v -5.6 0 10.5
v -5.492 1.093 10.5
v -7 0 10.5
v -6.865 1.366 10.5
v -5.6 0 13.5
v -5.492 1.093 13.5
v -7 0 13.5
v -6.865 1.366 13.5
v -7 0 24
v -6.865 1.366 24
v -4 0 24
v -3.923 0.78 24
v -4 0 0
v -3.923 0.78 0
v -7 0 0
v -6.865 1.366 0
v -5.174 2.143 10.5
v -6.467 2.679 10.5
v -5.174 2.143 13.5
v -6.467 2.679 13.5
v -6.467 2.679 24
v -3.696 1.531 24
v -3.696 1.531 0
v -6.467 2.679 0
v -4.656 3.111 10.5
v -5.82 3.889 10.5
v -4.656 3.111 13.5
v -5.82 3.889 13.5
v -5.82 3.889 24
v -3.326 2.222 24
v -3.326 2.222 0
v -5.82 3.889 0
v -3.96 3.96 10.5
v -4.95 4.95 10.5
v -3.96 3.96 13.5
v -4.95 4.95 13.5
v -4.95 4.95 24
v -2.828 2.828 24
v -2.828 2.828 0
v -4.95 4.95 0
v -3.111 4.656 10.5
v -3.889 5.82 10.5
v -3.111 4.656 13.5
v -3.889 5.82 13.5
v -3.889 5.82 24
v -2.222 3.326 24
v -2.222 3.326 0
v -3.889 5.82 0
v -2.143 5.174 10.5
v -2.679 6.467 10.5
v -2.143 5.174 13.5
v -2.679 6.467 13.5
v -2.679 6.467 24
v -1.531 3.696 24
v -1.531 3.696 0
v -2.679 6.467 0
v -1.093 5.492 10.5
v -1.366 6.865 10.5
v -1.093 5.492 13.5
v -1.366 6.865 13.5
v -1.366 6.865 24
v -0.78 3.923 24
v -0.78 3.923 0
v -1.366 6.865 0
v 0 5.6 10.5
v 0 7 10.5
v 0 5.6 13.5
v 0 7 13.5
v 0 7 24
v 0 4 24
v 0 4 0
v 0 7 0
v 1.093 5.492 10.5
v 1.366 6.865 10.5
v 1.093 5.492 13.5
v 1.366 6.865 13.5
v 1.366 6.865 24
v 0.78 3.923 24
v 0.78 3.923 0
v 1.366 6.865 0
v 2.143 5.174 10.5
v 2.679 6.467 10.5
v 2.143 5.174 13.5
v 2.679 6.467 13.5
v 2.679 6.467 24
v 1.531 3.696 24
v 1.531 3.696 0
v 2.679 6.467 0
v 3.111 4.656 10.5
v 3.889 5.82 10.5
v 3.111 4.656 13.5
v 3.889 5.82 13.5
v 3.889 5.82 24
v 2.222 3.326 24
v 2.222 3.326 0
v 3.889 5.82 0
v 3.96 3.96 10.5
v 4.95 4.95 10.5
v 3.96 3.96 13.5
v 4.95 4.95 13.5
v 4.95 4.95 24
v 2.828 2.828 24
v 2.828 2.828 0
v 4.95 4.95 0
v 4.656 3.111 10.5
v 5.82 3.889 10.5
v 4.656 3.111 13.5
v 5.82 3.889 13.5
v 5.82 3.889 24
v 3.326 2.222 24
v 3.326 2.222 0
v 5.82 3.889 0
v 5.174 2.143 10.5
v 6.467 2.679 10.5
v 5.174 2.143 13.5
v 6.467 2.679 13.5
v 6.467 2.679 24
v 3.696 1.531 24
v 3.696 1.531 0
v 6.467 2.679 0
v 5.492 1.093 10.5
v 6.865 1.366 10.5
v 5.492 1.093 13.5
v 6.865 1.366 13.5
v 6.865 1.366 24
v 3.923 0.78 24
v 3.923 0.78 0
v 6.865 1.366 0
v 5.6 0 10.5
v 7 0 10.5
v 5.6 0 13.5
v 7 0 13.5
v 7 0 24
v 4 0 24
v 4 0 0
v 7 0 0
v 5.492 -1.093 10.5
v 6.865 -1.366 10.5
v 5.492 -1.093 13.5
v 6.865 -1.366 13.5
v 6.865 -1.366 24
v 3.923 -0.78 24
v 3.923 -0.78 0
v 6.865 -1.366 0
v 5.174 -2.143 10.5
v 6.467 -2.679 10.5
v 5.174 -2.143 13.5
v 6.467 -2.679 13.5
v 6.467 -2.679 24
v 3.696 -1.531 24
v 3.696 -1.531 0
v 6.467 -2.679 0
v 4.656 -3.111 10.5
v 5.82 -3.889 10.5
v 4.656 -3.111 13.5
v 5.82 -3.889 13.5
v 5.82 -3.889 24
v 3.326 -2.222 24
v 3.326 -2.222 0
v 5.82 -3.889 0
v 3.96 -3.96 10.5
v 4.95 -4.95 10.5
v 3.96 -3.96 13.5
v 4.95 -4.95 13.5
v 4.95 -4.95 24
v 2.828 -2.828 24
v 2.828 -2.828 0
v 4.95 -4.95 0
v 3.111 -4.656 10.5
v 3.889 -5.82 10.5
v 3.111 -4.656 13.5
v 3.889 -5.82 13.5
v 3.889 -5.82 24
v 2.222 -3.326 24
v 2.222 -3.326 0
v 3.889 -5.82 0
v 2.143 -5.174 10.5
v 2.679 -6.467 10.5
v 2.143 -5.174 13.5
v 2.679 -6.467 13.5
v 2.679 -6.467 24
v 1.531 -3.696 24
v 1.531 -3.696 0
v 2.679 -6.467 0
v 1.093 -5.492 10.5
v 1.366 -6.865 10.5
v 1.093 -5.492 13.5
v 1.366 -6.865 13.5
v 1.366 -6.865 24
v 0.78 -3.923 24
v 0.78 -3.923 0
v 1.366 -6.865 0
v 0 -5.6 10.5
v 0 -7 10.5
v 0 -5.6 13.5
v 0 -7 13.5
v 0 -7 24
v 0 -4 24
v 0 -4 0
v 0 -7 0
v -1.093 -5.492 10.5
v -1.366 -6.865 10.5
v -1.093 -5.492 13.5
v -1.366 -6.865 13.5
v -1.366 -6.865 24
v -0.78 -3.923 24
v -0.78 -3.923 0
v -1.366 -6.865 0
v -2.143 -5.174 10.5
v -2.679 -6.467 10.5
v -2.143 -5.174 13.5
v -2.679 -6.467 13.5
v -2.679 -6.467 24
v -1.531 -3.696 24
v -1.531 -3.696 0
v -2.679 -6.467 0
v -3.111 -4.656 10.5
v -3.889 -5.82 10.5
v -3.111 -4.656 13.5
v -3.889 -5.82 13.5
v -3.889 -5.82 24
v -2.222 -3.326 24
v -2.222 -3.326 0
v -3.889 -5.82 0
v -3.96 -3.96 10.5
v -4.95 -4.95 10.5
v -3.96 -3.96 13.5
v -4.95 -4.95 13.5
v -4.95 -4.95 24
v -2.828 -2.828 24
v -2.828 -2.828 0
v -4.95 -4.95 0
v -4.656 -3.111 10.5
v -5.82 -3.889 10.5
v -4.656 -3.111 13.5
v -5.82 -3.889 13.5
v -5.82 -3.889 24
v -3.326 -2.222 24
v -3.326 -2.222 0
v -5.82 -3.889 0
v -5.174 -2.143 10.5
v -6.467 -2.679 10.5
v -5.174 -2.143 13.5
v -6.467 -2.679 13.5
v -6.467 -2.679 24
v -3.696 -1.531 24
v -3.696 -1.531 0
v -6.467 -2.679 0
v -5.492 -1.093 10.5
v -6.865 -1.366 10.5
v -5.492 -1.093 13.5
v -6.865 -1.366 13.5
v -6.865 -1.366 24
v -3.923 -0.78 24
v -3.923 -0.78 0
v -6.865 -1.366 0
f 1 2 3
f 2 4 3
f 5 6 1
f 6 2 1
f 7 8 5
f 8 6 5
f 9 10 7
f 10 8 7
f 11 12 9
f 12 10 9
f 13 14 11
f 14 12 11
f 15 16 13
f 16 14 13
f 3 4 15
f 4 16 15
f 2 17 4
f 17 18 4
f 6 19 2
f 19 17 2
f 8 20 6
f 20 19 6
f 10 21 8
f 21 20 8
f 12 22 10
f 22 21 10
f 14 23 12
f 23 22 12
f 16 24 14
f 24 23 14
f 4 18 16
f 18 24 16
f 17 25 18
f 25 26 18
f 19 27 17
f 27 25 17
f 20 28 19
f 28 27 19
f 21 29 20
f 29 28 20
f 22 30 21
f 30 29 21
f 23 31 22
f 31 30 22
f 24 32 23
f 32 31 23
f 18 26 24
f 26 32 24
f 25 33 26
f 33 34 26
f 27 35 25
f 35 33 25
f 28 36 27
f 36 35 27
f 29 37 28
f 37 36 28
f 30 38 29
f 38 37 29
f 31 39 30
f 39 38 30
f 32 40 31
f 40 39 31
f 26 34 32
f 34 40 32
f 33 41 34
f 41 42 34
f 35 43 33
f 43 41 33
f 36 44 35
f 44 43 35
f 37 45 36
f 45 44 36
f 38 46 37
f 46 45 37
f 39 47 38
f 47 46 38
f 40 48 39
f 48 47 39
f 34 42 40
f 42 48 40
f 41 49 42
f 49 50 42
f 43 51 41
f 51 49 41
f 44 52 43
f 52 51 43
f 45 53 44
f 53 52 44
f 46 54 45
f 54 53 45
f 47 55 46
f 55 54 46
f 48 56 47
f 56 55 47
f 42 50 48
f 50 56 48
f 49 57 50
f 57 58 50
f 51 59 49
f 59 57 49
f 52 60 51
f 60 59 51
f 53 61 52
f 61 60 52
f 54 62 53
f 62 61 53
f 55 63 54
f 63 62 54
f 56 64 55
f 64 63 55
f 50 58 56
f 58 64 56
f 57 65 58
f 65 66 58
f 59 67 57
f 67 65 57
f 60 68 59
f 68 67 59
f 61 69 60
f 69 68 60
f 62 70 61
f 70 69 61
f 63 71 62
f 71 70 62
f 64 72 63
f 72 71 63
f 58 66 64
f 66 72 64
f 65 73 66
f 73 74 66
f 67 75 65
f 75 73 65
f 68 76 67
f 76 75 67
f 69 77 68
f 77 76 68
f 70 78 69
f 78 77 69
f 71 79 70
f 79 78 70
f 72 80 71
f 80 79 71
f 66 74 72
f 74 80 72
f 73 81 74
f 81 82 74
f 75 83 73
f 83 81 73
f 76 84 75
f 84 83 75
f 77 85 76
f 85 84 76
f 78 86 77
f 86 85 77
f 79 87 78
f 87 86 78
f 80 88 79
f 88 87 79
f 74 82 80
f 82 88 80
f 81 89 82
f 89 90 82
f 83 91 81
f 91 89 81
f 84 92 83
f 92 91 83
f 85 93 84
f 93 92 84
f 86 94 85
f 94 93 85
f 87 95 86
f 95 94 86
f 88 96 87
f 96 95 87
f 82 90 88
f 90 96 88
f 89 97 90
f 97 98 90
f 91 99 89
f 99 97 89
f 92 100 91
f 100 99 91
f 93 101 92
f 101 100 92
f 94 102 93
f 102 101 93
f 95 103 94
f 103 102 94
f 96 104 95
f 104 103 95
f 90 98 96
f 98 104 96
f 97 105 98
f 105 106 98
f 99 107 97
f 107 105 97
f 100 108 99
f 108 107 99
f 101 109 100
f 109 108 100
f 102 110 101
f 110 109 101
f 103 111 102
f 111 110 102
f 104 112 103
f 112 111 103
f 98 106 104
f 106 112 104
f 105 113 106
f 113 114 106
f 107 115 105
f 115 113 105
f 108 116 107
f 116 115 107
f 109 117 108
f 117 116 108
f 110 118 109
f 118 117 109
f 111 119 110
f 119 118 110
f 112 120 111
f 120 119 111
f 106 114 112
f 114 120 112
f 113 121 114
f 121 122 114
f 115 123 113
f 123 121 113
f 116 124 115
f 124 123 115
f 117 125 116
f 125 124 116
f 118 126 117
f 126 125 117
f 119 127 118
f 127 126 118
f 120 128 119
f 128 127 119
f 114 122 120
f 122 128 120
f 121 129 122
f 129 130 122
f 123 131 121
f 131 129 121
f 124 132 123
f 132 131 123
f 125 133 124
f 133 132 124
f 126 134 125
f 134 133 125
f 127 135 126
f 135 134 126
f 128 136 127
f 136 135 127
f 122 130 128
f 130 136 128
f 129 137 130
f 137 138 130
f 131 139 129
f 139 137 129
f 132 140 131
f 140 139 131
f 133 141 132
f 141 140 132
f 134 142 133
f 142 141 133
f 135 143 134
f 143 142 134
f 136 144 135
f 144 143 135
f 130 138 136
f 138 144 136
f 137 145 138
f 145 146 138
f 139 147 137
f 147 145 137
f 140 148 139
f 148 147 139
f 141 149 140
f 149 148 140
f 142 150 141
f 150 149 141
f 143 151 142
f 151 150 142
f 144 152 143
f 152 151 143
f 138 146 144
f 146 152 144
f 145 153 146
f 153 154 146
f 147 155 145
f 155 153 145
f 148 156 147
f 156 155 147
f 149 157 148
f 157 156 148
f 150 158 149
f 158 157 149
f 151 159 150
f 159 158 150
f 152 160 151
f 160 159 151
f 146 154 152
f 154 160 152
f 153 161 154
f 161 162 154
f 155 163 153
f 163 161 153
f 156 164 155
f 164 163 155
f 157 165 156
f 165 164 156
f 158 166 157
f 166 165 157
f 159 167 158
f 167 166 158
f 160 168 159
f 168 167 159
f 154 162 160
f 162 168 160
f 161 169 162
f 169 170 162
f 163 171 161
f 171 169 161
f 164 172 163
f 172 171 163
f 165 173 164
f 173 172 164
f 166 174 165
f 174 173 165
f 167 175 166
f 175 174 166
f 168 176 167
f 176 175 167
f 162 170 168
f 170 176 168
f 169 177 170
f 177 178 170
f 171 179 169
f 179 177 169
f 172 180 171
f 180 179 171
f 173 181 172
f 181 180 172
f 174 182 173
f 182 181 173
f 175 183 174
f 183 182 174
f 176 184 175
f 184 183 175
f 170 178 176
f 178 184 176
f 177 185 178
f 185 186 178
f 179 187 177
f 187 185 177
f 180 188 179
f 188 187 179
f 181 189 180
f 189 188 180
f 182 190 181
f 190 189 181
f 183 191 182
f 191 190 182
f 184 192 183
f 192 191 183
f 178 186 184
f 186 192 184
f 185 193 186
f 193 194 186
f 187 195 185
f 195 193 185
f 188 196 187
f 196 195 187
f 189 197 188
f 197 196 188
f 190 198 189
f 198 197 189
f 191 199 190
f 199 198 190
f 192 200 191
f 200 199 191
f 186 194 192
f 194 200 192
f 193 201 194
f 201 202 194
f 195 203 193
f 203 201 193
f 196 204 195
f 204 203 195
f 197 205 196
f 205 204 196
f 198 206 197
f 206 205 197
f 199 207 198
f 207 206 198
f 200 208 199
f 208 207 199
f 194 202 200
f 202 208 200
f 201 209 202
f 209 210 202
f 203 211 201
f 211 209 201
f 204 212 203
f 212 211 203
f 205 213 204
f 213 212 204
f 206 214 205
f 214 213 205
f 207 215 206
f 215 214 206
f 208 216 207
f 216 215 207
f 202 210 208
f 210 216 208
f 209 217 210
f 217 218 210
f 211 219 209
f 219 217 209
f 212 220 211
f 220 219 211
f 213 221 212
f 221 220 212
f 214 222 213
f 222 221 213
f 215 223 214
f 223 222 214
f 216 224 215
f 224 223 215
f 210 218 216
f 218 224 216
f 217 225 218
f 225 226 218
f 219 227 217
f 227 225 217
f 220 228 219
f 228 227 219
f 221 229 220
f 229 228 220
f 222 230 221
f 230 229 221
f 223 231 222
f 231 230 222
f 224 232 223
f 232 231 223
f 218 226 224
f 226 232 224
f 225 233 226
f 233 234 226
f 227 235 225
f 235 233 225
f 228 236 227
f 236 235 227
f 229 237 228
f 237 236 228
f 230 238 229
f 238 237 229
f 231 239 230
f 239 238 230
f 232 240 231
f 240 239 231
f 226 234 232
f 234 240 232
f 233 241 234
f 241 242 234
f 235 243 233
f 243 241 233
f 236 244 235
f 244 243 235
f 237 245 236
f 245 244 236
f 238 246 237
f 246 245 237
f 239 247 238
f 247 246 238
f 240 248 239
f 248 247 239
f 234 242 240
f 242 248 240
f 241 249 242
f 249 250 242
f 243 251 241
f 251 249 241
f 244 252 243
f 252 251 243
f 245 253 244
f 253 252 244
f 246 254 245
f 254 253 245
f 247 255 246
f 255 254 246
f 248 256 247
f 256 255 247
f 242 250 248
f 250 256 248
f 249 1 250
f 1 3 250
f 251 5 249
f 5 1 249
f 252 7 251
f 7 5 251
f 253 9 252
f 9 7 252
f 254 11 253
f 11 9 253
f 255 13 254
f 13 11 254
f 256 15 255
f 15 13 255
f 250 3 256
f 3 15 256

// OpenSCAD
$fn = 32;

// ----------------------------------------------------------------------
// Grooved revolve: stepped, bore R4
// ----------------------------------------------------------------------

// --- parameters (mm) ---
bore_r = 4;               // bore radius
outer_r = 7;              // outer radius of the body
total_h = 24;             // overall height, Z
wall = 3;                 // radial wall thickness
groove_w = 3;             // groove width
groove_d = 1.4;           // groove depth
grooves = 1;              // number of outer grooves

bbox_x = 2 * outer_r;  // full diameter
bore_d = 2 * bore_r;  // bore diameter
body_d = 2 * outer_r;  // body diameter
revolve_angle = 360;  // full turn around the Z axis

profile = [[4, 0], [7, 0], [7, 10.5], [5.6, 10.5], [5.6, 13.5], [7, 13.5], [7, 24], [4, 24]];  // primary outline, 8 points, counter clockwise

// --- the one profile operation ---
rotate_extrude(angle = revolve_angle) polygon(points = profile);
